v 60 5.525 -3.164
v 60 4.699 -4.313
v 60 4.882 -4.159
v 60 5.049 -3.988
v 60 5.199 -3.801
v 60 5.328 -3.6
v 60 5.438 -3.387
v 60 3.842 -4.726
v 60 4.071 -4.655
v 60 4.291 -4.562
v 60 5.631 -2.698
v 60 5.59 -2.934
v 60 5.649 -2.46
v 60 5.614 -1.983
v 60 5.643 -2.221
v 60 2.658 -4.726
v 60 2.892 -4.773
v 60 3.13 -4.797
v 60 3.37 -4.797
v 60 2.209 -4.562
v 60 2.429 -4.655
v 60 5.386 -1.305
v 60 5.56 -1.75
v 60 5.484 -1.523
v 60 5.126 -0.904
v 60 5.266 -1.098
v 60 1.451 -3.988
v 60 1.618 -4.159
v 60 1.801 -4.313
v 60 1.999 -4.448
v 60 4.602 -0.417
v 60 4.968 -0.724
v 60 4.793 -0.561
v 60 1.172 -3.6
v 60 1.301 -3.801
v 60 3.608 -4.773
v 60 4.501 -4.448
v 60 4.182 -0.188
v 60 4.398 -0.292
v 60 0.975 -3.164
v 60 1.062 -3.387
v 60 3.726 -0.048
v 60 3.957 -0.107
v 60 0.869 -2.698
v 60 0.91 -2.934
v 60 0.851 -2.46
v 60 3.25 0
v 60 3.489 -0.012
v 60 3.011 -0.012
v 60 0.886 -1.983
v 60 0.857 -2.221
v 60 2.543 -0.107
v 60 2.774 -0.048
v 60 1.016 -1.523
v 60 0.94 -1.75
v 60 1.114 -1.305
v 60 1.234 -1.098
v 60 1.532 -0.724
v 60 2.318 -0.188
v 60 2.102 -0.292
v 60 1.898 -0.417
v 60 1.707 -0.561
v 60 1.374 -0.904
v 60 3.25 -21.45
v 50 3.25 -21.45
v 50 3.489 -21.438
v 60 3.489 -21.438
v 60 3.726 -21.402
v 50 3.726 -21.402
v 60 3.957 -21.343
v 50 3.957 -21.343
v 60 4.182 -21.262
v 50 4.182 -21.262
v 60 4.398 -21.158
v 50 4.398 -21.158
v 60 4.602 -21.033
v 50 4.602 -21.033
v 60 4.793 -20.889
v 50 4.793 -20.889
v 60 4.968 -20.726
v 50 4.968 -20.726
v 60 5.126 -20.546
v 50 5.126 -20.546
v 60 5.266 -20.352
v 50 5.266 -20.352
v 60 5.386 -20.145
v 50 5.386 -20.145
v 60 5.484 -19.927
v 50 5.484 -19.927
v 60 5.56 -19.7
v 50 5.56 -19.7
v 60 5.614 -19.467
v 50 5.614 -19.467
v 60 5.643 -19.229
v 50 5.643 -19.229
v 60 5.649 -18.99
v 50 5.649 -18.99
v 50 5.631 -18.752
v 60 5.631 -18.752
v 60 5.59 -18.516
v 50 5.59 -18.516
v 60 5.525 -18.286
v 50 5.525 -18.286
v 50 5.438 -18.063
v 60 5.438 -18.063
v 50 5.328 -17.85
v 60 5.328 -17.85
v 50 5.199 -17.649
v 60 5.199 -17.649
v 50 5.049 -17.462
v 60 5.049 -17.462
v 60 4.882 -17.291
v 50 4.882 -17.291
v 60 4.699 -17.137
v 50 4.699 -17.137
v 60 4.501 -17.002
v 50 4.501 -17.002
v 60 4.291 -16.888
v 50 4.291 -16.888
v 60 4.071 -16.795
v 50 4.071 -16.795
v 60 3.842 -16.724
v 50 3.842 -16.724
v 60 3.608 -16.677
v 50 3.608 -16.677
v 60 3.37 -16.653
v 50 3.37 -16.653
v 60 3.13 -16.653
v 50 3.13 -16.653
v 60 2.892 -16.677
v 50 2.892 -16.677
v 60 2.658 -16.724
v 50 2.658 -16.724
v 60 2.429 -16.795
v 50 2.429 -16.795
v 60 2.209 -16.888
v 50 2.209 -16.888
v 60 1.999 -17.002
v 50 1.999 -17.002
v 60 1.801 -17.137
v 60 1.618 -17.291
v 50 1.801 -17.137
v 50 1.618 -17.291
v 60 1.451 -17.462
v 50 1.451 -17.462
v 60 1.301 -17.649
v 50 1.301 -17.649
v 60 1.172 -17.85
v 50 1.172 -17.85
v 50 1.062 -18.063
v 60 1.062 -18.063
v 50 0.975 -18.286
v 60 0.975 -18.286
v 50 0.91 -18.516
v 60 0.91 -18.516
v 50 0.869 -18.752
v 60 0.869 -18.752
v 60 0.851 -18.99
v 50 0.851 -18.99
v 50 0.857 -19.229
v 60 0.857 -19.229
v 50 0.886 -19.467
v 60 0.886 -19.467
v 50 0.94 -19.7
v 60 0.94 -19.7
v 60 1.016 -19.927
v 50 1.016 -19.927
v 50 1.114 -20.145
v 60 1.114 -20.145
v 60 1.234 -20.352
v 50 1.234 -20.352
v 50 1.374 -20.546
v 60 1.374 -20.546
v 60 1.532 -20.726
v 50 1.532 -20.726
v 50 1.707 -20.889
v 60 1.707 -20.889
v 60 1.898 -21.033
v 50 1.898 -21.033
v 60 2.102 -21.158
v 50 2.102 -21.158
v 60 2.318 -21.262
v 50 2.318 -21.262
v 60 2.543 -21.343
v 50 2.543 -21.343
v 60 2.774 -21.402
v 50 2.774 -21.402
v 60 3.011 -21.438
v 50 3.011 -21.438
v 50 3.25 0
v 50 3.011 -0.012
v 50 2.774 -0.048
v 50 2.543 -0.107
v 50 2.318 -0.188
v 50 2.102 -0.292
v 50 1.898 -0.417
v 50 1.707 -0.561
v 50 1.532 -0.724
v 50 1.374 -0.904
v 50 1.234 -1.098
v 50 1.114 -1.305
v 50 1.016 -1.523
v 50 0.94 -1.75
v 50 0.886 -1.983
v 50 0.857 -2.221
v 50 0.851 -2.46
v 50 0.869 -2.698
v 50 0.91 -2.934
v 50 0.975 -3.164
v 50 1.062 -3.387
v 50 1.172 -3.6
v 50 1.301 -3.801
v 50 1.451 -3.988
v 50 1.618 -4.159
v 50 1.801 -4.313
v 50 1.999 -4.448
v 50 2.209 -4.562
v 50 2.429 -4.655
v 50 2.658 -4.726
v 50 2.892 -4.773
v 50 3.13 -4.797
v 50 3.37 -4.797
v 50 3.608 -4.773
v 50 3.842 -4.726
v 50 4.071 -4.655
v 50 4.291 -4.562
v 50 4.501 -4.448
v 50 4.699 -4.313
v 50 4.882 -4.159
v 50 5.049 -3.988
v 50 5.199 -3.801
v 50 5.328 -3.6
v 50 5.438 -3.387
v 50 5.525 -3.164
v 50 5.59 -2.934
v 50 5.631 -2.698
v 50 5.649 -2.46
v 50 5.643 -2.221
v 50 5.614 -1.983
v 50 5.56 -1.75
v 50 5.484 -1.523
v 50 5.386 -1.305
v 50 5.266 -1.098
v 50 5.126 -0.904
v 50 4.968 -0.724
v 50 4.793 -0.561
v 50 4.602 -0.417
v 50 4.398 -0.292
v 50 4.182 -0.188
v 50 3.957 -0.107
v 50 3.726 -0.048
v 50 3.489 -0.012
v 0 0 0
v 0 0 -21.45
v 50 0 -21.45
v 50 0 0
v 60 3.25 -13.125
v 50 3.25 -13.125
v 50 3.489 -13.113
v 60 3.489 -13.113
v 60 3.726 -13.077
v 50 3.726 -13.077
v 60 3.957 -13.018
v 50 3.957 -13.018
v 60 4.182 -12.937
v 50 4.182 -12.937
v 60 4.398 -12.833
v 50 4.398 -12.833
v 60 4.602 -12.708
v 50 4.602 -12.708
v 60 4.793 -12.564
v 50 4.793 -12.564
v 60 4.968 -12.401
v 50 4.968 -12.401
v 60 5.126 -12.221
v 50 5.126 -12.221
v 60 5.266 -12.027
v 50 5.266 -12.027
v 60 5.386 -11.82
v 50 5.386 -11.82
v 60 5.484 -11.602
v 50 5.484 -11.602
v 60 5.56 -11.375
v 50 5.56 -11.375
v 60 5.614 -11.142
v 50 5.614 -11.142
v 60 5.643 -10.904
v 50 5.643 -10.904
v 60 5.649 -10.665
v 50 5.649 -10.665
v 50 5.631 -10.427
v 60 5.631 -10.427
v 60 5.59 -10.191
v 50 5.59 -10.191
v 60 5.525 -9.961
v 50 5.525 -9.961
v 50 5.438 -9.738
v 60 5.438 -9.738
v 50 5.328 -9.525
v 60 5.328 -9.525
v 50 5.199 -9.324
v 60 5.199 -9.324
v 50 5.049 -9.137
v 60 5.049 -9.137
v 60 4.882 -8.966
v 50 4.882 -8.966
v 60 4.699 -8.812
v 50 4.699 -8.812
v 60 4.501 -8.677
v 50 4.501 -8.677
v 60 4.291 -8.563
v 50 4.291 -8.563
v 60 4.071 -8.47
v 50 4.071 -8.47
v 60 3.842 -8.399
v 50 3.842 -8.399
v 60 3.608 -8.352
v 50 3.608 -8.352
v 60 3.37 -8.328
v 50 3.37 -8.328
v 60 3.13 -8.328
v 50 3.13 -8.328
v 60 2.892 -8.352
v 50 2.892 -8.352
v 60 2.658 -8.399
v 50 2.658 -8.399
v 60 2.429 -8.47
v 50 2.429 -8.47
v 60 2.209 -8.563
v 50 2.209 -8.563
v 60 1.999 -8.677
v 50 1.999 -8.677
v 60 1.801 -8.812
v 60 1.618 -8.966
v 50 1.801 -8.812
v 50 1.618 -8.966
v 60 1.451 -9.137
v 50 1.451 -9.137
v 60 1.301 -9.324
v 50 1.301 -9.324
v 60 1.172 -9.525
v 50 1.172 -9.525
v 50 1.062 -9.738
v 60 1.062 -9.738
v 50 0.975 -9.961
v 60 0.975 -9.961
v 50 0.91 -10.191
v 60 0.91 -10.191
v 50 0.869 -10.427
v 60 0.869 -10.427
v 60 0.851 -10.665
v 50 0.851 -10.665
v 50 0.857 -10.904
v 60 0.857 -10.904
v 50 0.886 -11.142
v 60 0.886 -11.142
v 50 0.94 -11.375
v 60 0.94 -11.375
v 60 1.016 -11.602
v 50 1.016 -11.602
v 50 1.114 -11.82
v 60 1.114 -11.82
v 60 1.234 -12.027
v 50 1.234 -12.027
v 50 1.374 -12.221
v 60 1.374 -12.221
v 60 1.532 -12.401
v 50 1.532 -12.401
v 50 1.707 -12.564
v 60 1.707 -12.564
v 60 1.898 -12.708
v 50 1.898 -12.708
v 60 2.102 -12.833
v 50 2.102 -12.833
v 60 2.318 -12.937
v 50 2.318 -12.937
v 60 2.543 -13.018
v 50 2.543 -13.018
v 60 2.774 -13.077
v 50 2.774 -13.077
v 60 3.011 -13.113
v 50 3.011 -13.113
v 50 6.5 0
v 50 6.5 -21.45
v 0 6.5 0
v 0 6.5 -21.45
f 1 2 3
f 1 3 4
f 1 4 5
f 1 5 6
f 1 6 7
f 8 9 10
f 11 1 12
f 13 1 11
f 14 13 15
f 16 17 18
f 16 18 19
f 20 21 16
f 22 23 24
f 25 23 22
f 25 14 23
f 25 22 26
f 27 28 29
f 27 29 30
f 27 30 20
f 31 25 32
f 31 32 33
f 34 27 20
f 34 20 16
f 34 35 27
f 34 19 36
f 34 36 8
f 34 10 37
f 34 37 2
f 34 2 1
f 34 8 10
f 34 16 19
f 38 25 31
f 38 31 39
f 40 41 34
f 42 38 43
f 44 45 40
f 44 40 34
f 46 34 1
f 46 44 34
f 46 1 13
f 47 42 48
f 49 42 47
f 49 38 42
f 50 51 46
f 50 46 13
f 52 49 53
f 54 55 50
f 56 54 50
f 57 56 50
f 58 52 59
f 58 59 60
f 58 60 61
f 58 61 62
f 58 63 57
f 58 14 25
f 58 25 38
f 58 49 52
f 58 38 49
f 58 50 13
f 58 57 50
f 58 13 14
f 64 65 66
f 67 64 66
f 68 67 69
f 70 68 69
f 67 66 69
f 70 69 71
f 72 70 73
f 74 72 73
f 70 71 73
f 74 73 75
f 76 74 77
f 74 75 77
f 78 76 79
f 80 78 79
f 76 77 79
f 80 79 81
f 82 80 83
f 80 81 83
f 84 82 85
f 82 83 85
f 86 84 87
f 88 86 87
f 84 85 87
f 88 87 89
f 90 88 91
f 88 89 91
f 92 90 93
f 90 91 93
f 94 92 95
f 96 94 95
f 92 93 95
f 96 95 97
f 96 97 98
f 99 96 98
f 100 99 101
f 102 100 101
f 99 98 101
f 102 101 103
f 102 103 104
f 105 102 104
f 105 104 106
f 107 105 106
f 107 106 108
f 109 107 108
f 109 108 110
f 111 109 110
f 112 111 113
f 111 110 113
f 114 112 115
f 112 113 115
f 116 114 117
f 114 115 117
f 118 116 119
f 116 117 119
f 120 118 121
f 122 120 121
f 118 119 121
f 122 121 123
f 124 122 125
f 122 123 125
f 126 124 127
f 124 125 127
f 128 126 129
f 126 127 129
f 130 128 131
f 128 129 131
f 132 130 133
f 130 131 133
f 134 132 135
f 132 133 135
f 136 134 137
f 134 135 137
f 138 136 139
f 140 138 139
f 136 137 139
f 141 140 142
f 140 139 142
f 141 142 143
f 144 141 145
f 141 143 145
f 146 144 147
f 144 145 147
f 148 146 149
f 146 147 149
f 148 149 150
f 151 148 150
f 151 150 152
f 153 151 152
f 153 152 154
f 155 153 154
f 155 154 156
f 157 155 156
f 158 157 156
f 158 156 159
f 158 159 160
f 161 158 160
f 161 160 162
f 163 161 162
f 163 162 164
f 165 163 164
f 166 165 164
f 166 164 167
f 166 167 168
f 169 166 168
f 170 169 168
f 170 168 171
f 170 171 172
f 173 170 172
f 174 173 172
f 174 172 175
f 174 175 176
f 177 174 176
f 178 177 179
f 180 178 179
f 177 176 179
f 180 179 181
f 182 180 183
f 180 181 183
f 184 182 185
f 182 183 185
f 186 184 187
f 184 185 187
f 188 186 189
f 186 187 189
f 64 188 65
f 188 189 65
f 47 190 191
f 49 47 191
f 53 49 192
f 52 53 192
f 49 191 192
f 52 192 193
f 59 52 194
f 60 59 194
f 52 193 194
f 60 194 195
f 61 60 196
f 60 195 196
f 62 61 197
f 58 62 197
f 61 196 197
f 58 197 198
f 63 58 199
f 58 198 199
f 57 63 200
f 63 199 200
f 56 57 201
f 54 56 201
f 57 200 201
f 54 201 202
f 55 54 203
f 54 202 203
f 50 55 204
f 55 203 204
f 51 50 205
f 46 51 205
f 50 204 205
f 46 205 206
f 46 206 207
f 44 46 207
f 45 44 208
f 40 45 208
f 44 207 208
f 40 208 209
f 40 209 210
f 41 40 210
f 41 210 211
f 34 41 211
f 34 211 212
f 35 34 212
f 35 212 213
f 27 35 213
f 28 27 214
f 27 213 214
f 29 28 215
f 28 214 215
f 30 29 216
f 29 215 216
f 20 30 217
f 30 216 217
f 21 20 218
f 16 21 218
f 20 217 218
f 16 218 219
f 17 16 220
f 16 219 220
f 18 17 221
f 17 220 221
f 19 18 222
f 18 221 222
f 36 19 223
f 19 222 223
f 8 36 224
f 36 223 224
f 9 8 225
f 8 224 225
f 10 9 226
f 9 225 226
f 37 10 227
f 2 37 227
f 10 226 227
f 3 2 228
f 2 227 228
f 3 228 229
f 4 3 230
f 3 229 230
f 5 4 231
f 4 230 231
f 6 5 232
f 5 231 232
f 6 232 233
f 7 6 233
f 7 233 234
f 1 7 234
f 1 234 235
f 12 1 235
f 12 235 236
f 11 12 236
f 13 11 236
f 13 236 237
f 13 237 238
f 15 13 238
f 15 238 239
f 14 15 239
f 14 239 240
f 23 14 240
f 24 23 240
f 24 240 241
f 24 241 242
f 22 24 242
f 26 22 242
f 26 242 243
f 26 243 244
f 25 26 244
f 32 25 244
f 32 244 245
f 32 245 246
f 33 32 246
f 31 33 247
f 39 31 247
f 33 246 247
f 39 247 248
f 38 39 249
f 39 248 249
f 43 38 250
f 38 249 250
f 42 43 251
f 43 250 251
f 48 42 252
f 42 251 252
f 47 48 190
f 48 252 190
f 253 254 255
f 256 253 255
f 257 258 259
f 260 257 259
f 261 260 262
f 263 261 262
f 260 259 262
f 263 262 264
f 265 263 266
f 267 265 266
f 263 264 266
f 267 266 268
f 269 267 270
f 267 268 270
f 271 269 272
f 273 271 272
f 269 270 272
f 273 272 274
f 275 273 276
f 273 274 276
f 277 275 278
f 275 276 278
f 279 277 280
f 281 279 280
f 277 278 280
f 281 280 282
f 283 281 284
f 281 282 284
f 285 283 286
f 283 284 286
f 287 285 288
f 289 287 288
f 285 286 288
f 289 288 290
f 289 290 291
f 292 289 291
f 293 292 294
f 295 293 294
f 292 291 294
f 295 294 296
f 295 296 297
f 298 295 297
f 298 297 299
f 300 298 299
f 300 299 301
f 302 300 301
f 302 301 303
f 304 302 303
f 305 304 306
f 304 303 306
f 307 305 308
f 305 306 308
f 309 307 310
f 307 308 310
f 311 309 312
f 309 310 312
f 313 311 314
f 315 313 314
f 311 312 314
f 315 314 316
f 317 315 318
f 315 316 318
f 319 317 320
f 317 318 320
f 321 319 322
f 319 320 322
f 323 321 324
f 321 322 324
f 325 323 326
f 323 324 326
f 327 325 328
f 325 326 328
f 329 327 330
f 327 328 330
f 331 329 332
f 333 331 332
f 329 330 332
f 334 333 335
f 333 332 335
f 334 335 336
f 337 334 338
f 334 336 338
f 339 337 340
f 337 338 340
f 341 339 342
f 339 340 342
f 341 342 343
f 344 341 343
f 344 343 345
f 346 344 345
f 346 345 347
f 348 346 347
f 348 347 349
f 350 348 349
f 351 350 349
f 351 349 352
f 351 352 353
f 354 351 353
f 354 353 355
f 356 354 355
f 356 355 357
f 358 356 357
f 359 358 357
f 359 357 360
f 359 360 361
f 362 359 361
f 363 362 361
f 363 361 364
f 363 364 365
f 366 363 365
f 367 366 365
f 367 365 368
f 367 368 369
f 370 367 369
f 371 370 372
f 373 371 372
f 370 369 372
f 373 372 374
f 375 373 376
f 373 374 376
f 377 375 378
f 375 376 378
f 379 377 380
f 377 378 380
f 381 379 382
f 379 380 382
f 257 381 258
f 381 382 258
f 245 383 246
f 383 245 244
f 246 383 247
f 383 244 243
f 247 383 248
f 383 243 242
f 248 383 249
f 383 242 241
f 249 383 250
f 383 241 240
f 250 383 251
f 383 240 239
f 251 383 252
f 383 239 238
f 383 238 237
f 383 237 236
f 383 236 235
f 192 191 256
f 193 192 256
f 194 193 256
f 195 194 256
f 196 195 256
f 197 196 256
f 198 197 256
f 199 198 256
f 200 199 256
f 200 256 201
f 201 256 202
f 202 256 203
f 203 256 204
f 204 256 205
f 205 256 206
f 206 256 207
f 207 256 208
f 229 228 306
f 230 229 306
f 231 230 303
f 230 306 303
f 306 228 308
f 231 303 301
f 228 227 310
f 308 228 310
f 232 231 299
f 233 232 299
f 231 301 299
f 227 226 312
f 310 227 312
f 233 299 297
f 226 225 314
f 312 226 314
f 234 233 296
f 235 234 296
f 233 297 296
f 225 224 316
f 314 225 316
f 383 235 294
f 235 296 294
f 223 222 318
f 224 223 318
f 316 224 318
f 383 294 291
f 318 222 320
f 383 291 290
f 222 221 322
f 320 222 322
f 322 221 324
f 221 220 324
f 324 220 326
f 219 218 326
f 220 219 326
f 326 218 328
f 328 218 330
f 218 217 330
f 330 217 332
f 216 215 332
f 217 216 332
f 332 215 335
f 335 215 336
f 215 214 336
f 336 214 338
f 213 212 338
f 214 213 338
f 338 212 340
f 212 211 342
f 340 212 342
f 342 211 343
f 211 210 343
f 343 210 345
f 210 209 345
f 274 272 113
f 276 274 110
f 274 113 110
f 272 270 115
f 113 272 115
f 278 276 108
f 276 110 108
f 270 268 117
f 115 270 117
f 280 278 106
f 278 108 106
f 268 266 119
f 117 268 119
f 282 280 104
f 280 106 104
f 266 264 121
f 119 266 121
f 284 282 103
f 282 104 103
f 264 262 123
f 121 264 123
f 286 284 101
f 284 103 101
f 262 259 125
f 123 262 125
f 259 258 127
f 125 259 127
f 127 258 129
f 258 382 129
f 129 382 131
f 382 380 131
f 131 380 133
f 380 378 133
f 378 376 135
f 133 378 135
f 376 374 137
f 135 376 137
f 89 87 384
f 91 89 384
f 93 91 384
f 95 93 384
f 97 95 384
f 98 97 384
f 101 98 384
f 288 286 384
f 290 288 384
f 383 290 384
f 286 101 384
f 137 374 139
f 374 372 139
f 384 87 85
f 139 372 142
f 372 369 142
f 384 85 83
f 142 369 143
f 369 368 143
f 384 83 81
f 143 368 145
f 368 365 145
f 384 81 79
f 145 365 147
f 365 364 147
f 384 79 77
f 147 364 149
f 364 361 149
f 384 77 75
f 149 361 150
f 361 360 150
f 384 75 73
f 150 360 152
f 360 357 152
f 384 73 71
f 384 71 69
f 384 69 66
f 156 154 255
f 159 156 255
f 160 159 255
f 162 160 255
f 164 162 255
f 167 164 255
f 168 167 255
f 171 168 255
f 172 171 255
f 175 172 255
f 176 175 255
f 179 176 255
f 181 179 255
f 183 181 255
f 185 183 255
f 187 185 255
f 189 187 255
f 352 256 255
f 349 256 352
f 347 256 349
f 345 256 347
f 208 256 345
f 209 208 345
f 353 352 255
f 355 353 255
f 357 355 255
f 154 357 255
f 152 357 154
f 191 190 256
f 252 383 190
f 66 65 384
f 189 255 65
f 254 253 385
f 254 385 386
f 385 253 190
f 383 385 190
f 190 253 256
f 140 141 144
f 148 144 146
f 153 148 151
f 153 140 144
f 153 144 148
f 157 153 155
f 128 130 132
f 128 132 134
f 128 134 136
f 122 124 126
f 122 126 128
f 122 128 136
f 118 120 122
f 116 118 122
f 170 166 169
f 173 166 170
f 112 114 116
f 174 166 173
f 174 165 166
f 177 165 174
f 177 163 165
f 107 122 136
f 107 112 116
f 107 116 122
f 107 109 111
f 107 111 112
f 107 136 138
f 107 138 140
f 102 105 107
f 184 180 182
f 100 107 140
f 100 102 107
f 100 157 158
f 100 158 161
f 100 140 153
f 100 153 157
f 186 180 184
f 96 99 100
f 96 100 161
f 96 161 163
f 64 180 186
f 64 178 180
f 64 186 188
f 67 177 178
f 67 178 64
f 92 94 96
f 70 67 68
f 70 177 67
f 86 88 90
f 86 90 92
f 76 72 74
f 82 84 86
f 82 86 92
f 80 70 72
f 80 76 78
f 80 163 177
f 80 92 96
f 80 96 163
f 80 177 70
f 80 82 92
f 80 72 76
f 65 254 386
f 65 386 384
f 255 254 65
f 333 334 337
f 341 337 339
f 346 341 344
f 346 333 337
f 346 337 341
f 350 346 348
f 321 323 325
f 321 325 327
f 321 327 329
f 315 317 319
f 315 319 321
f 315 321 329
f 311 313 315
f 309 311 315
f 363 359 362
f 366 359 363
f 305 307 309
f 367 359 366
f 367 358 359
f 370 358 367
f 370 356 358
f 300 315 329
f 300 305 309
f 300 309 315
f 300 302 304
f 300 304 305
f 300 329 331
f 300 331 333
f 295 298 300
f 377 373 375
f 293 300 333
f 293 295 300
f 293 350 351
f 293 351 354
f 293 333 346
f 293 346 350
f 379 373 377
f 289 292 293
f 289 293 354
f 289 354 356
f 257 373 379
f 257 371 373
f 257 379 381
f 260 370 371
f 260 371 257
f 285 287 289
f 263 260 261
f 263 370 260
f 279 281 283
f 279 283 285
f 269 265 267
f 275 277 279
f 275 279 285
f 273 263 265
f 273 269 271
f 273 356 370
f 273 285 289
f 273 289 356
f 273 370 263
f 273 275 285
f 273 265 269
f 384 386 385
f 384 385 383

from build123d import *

# Parameters (mm, degrees)
SKETCH1_W           = 50
SKETCH1_H           = 21.45
BOSS_EXTRUDE1_DEPTH = 6.5
SKETCH2_R           = 2.4
BOSS_EXTRUDE2_DEPTH = 10


with BuildPart() as part:
    # Sketch1 → Boss-Extrude1 (new body)
    with BuildSketch(Plane(origin=(0, 0, 0), x_dir=(1, 0, 0), z_dir=(0, 1, 0))):
        with Locations((25, 10.725)):
            Rectangle(SKETCH1_W, SKETCH1_H)
    extrude(amount=BOSS_EXTRUDE1_DEPTH)

    # Sketch2 → Boss-Extrude2 (add)
    with BuildSketch(Plane(origin=(50, 0, 0), x_dir=(0, 0, -1), z_dir=(1, 0, 0))):
        with Locations((10.725, 3.25)):
            Circle(SKETCH2_R)
        with Locations(Location((2.4, 3.25, 0), (0, 0, 180))):
            Circle(SKETCH2_R)
        with Locations((19.05, 3.25)):
            Circle(SKETCH2_R)
    extrude(amount=BOSS_EXTRUDE2_DEPTH)


solid = part.part
